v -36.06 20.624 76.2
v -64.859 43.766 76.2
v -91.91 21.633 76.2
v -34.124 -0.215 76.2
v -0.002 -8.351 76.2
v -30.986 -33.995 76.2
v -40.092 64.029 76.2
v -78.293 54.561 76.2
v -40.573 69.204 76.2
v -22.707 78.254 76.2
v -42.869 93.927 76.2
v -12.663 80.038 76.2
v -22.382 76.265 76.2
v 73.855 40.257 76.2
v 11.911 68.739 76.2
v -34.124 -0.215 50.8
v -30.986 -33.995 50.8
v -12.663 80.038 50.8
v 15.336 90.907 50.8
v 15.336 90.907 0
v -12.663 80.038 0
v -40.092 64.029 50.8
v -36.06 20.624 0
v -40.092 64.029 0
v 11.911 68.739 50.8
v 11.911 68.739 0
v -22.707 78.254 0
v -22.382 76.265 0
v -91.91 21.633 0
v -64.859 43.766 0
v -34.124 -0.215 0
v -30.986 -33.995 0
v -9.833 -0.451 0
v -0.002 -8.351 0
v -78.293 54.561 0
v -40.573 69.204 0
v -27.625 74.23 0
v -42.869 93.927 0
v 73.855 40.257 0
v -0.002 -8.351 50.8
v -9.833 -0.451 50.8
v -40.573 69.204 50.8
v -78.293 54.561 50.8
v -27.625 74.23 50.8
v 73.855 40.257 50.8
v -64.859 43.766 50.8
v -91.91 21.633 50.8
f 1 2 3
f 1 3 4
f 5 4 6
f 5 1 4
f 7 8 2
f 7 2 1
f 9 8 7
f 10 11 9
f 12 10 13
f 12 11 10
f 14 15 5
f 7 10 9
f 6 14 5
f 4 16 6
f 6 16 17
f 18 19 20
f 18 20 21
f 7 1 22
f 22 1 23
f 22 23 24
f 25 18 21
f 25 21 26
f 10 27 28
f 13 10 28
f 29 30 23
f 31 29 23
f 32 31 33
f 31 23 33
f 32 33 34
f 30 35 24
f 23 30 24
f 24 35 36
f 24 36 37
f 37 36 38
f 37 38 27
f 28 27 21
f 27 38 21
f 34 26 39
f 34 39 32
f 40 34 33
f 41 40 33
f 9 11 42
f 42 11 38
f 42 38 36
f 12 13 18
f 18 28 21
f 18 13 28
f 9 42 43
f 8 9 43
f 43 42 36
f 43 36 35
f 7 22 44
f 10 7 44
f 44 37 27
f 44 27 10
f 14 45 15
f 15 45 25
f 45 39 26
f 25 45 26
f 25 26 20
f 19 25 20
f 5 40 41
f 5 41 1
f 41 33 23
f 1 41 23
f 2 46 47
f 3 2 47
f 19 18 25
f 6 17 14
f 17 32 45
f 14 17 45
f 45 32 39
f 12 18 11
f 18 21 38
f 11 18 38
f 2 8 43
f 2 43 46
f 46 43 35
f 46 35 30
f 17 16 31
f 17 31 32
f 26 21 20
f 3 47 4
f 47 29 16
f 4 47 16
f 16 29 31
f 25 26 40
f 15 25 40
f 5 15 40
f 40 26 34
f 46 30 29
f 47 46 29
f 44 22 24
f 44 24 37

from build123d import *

# Parameters (mm, degrees)
F1_DEPTH = 50.8
F3_DEPTH = 25.4


with BuildPart() as f1:
    # F0 (on Top) → F1 (new body)
    with BuildSketch(Plane.XY):
        Polygon((-12.6629137388, 80.0378082279), (11.9105604724, 68.7390780869), (15.3360962868, 90.9066982567), align=None)
    extrude(amount=F1_DEPTH)



with BuildPart() as f1b:
    # F0 (on Top) → F1, piece 2 (new body)
    with BuildSketch(Plane.XY):
        Polygon((-34.1239980282, -0.2150503281), (-30.985997676, -33.9947231274), (73.8553851843, 40.2572341263), (11.9105604724, 68.7390780869), (-0.0020810035, -8.3510257005), (-9.8334949385, -0.4507815641), (-8.273422718, -9.9886301905), align=None)
        Polygon((-91.9102034833, 21.6327455985), (-34.1239980282, -0.2150503281), (-36.0598630347, 20.6239806361), (-64.8586318768, 43.7658507867), align=None)
        Polygon((-64.8586318768, 43.7658507867), (-40.0920589133, 64.0294115337), (-40.5727160494, 69.2035475963), (-78.2927028271, 54.5610874592), align=None)
        Polygon((-36.0598630347, 20.6239806361), (-34.1239980282, -0.2150503281), (-8.273422718, -9.9886301905), (-9.8334949385, -0.4507815641), align=None)
        Polygon((-64.8586318768, 43.7658507867), (-36.0598630347, 20.6239806361), (-40.0920589133, 64.0294115337), align=None)
        Polygon((-40.5727160494, 69.2035475963), (-40.0920589133, 64.0294115337), (-27.6250758671, 74.2296709181), align=None)
        Polygon((-22.3816425497, 76.2651107443), (-12.6629137388, 80.0378082279), (-42.8693875083, 93.9265564244), (-40.5727160494, 69.2035475963), (-27.6250758671, 74.2296709181), (-22.7068983648, 78.2536345375), align=None)
    extrude(amount=F1_DEPTH)


with BuildPart() as f1_1:
    add(f1.part)

    add(f1b.part)  # F3 merges F1b
    # F2 (on Top) + F1_face (on face) + F1_face1 (on face) → F3 (join)
    with BuildSketch(Plane.XY):
        Polygon((11.9105604724, 68.7390780869), (-0.0020810035, -8.3510257005), (-36.0598630347, 20.6239806361), (-40.0920589133, 64.0294115337), (-22.7068983648, 78.2536345375), (-22.3816425497, 76.2651107443), (-12.6629137388, 80.0378082279), (-42.8693875083, 93.9265564244), (-40.5727160494, 69.2035475963), (-78.2927028271, 54.5610874592), (-64.8586318768, 43.7658507867), (-91.9102034833, 21.6327455985), (-34.1239980282, -0.2150503281), (-30.985997676, -33.9947231274), (73.8553851843, 40.2572341263), align=None)
        with BuildLine():
            add(Edge.make_bspline(
                [(-50.4296496511, 46.5946868062), (-54.7054451045, 47.8722705974), (-66.4098019094, 35.9516436531), (-39.8370794277, 25.946602289), (-45.778728134, 45.2050174432), (-50.4296496511, 46.5946868062)],
                knots=[0, 0, 0, 0, 0.3172189531, 0.6549506471, 1, 1, 1, 1], degree=3))
        make_face(mode=Mode.SUBTRACT)
        with BuildLine():
            add(Edge.make_bspline(
                [(25.4836957902, 45.4683750868), (28.757586761, 44.6744122845), (31.136551035, 27.5849724225), (12.800043704, 32.2532783382), (22.2382097568, 46.2554493079), (25.4836957902, 45.4683750868)],
                knots=[0, 0, 0, 0, 0.35616054, 0.6469295806, 1, 1, 1, 1], degree=3))
        make_face(mode=Mode.SUBTRACT)
        with BuildLine():
            add(Edge.make_bspline(
                [(-50.4296496511, 46.5946868062), (-54.7054451045, 47.8722705974), (-66.4098019094, 35.9516436531), (-39.8370794277, 25.946602289), (-45.778728134, 45.2050174432), (-50.4296496511, 46.5946868062)],
                knots=[0, 0, 0, 0, 0.3172189531, 0.6549506471, 1, 1, 1, 1], degree=3))
        make_face()
        with BuildLine():
            add(Edge.make_bspline(
                [(25.4836957902, 45.4683750868), (28.757586761, 44.6744122845), (31.136551035, 27.5849724225), (12.800043704, 32.2532783382), (22.2382097568, 46.2554493079), (25.4836957902, 45.4683750868)],
                knots=[0, 0, 0, 0, 0.35616054, 0.6469295806, 1, 1, 1, 1], degree=3))
        make_face()
    with BuildSketch(Plane(origin=(-12.5695281599, 29.2954338549, 50.8), x_dir=(1, 0, 0), z_dir=(0, 0, 1))):
        Polygon((12.5674471564, -37.6464595554), (-23.4903348748, -8.6714532188), (-27.5225307534, 34.7339776789), (-10.1373702049, 48.9582006826), (-9.8121143898, 46.9696768894), (-0.0933855789, 50.742374373), (-30.2998593484, 64.6311225695), (-28.0031878895, 39.9081137415), (-65.7231746673, 25.2656536044), (-52.2891037169, 14.4704169318), (-79.3406753235, -7.6626882564), (-21.5544698683, -29.510484183), (-18.4164695162, -63.2901569823), (86.4249133441, 10.9618002714), (24.4800886323, 39.443644232), align=None)
    with BuildSketch(Plane(origin=(-12.5695281599, 29.2954338549, 0), x_dir=(1, 0, 0), z_dir=(0, 0, -1))):
        Polygon((-23.4903348748, 8.6714532188), (12.5674471564, 37.6464595554), (24.4800886323, -39.443644232), (86.4249133441, -10.9618002714), (-18.4164695162, 63.2901569823), (-21.5544698683, 29.510484183), (-79.3406753235, 7.6626882564), (-52.2891037169, -14.4704169318), (-65.7231746673, -25.2656536044), (-28.0031878895, -39.9081137415), (-30.2998593484, -64.6311225695), (-0.0933855789, -50.742374373), (-9.8121143898, -46.9696768894), (-10.1373702049, -48.9582006826), (-27.5225307534, -34.7339776789), align=None)
    extrude(amount=F3_DEPTH, dir=(0, 0, 1))


solid = f1_1.part
